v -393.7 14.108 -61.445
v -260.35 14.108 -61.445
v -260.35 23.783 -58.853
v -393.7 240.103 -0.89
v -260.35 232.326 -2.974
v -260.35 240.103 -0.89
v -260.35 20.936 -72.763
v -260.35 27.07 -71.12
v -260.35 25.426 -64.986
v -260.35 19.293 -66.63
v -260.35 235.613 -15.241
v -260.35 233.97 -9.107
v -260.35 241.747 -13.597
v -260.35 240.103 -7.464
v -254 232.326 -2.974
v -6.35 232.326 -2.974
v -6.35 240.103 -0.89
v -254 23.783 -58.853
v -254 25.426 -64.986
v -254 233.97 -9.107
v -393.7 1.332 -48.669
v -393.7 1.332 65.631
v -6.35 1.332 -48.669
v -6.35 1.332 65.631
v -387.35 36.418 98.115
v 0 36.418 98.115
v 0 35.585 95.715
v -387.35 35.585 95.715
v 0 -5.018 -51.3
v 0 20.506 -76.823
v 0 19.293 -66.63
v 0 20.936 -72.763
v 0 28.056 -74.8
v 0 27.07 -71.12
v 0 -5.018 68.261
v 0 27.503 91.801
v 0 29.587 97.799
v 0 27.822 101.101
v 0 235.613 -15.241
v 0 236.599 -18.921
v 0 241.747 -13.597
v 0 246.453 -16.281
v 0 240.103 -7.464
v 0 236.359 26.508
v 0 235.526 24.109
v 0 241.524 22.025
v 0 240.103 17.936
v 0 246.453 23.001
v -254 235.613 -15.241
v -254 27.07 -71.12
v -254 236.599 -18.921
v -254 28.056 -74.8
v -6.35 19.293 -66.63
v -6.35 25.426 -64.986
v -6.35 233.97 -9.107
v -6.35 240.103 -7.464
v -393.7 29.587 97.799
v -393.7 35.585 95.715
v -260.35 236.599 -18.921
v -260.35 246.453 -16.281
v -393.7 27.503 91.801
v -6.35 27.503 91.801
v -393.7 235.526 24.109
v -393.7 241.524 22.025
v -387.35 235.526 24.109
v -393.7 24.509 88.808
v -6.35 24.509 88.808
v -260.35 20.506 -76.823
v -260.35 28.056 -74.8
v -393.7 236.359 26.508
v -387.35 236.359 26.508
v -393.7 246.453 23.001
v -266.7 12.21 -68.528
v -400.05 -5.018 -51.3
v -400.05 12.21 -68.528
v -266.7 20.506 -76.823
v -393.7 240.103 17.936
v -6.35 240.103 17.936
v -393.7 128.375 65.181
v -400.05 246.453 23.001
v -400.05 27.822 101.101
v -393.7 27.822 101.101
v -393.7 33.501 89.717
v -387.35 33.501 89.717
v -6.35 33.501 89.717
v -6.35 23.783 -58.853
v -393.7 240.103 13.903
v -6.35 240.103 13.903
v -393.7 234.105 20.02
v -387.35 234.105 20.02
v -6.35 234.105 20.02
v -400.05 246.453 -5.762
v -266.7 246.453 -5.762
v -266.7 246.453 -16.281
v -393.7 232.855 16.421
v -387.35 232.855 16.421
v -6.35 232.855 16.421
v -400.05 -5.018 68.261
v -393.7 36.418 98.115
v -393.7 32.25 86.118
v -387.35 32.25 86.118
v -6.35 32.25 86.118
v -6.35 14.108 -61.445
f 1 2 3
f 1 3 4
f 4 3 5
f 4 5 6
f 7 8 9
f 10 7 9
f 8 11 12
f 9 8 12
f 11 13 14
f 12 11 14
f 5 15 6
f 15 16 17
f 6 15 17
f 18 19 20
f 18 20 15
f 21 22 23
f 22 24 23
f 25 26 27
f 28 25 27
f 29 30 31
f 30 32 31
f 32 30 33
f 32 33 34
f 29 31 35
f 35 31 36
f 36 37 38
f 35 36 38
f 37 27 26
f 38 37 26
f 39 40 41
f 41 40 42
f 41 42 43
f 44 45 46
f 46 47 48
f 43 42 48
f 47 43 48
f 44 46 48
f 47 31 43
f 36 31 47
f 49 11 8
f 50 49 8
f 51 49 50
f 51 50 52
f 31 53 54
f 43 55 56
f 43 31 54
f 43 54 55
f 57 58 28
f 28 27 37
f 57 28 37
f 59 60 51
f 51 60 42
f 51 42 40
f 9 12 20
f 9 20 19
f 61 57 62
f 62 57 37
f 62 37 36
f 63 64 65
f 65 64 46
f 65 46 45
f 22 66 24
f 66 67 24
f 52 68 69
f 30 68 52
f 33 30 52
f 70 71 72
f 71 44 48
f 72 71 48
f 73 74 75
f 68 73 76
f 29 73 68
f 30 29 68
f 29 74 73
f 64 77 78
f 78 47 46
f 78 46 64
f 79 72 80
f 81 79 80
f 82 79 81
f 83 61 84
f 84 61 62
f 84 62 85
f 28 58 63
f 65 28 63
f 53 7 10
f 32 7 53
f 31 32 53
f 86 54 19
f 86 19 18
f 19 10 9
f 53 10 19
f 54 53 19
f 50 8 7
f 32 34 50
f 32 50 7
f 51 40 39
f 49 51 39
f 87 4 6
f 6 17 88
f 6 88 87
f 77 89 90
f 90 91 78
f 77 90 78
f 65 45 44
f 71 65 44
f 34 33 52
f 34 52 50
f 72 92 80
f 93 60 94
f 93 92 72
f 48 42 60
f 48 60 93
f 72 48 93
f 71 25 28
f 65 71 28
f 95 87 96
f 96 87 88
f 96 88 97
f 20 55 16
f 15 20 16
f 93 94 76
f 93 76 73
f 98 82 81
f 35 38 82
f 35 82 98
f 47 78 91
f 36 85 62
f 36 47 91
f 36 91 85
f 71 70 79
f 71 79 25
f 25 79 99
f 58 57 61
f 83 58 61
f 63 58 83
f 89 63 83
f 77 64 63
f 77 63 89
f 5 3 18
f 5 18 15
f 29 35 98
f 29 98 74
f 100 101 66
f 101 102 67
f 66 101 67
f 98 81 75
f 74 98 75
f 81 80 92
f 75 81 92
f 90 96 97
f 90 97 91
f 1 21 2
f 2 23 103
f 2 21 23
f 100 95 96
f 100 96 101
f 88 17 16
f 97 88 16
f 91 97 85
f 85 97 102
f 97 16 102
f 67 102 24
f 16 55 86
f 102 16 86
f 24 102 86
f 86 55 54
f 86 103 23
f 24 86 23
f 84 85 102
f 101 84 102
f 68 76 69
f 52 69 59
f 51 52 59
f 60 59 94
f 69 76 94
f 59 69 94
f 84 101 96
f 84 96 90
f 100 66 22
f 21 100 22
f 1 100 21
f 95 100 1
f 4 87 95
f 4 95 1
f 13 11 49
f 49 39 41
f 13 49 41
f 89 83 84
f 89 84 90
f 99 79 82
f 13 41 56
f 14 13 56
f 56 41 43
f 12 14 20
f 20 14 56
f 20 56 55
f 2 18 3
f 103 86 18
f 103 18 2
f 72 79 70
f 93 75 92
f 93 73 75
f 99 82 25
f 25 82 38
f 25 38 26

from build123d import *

# Parameters (mm, degrees)
BOSS_EXTRUDE2_DEPTH      = 6.35
BOSS_EXTRUDE3_DEPTH      = 254
BOSS_EXTRUDE3_DEPTH_BACK = 6.35
BOSS_EXTRUDE4_DEPTH      = 254
BOSS_EXTRUDE4_DEPTH_BACK = 6.35
BOSS_EXTRUDE5_DEPTH      = 133.35
BOSS_EXTRUDE6_DEPTH      = 6.35
BOSS_EXTRUDE8_DEPTH      = 6.35
BOSS_EXTRUDE9_DEPTH      = 6.35
BOSS_EXTRUDE10_DEPTH     = 6.35


with BuildPart() as part:
    # 3DSketch1 → Boss-Extrude2 (new body)
    with BuildSketch(Plane(origin=(0, 1.332156405, 65.630699338), x_dir=(0, 0.9561985348142941, -0.2927189129847902), z_dir=(-1, 0, 0))):
        Polygon((0, 0), (33.457771754, 109.293492529), (55.888968865, 121.2099264), (249.70876595, 0), (242.27370556, -24.287442784), (17.363491096, -32.684601412), align=None)
    extrude(amount=BOSS_EXTRUDE2_DEPTH)

    # Sketch2 → Boss-Extrude3 (add, two sides: drawn at the far end of the back side and taken through both)
    with BuildSketch(Plane.ZY.offset(6.35).offset(-BOSS_EXTRUDE3_DEPTH_BACK)):
        Polygon((-61.445059615, 14.107915358), (-48.669300662, 1.332156405), (65.630699338, 1.332156405), (88.807649546, 24.509106613), (86.118065358, 32.250379724), (89.717035392, 33.500785537), (91.80104508, 27.502502147), (97.799328469, 29.586511835), (95.715318781, 35.584795224), (98.114632137, 36.4183991), (101.101183052, 27.822383999), (68.260955459, -5.017843595), (-51.299556783, -5.017843595), (-76.823169583, 20.505769205), (-74.800118363, 28.055899142), (-71.119940965, 27.069798581), (-72.763441901, 20.936169584), (-66.629812904, 19.292668647), (-64.986311968, 25.426297644), (-58.852682971, 23.782796708), align=None)
    extrude(amount=BOSS_EXTRUDE3_DEPTH + BOSS_EXTRUDE3_DEPTH_BACK)

    # Sketch4 → Boss-Extrude4 (add, two sides: drawn at the far end of the back side and taken through both)
    with BuildSketch(Plane.ZY.offset(6.35).offset(-BOSS_EXTRUDE4_DEPTH_BACK)):
        Polygon((-0.889775448, 240.103312537), (13.902816842, 240.103312537), (16.42126046, 232.854623335), (20.020230494, 234.105029148), (17.936220806, 240.103312537), (22.024731964, 241.523801752), (24.108741651, 235.525518362), (26.508055007, 236.359122237), (23.000986566, 246.453312537), (-16.280707815, 246.453312537), (-18.921086525, 236.599285038), (-15.240909127, 235.613184476), (-13.597408191, 241.746813473), (-7.463779194, 240.103312537), (-9.10728013, 233.96968354), (-2.973651133, 232.326182604), align=None)
    extrude(amount=BOSS_EXTRUDE4_DEPTH + BOSS_EXTRUDE4_DEPTH_BACK)

    # Sketch5 → Boss-Extrude5 (add)
    with BuildSketch(Plane.ZY.offset(260.35)):
        Polygon((-68.52756432, 12.210163942), (-51.299556783, -5.017843595), (68.260955459, -5.017843595), (101.101183052, 27.822383999), (98.114632137, 36.4183991), (95.715318781, 35.584795224), (97.799328469, 29.586511835), (91.80104508, 27.502502147), (89.717035392, 33.500785537), (86.118065358, 32.250379724), (88.807649546, 24.509106613), (65.630699338, 1.332156405), (-48.669300662, 1.332156405), (-61.445059615, 14.107915358), (-0.889775448, 240.103312537), (13.902816842, 240.103312537), (16.42126046, 232.854623335), (20.020230494, 234.105029148), (17.936220806, 240.103312537), (22.024731964, 241.523801752), (24.108741651, 235.525518362), (26.508055007, 236.359122237), (23.000986566, 246.453312537), (-5.762301822, 246.453312537), align=None)
    extrude(amount=BOSS_EXTRUDE5_DEPTH)

    # Sketch7 → Boss-Extrude6 (add)
    with BuildSketch(Plane.ZY.offset(260.35)):
        Polygon((-16.280707815, 246.453312537), (-76.823169583, 20.505769205), (-68.52756432, 12.210163942), (-5.762301822, 246.453312537), align=None)
    extrude(amount=BOSS_EXTRUDE6_DEPTH)

    # Sketch9 → Boss-Extrude8 (add)
    with BuildSketch(Plane(origin=(-260.35, 0, 0), x_dir=(0, 0, -1), z_dir=(1, 0, 0))):
        Polygon((15.240909127, 235.613184476), (71.119940965, 27.069798581), (74.800118363, 28.055899142), (18.921086525, 236.599285038), align=None)
        Polygon((2.973651133, 232.326182604), (9.10728013, 233.96968354), (64.986311968, 25.426297644), (58.852682971, 23.782796708), align=None)
    extrude(amount=BOSS_EXTRUDE8_DEPTH)

    # Sketch11 → Boss-Extrude9 (add)
    with BuildSketch(Plane.ZY.offset(393.7)):
        Polygon((23.000986566, 246.453312537), (101.101183052, 27.822383999), (68.260955459, -5.017843595), (-51.299556783, -5.017843595), (-68.52756432, 12.210163942), (-5.762301822, 246.453312537), align=None)
    extrude(amount=BOSS_EXTRUDE9_DEPTH)

    # Sketch12 → Boss-Extrude10 (add)
    with BuildSketch(Plane(origin=(-393.7, 0, 0), x_dir=(0, 0, -1), z_dir=(1, 0, 0))):
        Polygon((-24.108741651, 235.525518362), (-26.508055007, 236.359122237), (-98.114632137, 36.4183991), (-95.715318781, 35.584795224), align=None)
        Polygon((-20.020230494, 234.105029148), (-16.42126046, 232.854623335), (-86.118065358, 32.250379724), (-89.717035392, 33.500785537), align=None)
    extrude(amount=BOSS_EXTRUDE10_DEPTH)


solid = part.part
